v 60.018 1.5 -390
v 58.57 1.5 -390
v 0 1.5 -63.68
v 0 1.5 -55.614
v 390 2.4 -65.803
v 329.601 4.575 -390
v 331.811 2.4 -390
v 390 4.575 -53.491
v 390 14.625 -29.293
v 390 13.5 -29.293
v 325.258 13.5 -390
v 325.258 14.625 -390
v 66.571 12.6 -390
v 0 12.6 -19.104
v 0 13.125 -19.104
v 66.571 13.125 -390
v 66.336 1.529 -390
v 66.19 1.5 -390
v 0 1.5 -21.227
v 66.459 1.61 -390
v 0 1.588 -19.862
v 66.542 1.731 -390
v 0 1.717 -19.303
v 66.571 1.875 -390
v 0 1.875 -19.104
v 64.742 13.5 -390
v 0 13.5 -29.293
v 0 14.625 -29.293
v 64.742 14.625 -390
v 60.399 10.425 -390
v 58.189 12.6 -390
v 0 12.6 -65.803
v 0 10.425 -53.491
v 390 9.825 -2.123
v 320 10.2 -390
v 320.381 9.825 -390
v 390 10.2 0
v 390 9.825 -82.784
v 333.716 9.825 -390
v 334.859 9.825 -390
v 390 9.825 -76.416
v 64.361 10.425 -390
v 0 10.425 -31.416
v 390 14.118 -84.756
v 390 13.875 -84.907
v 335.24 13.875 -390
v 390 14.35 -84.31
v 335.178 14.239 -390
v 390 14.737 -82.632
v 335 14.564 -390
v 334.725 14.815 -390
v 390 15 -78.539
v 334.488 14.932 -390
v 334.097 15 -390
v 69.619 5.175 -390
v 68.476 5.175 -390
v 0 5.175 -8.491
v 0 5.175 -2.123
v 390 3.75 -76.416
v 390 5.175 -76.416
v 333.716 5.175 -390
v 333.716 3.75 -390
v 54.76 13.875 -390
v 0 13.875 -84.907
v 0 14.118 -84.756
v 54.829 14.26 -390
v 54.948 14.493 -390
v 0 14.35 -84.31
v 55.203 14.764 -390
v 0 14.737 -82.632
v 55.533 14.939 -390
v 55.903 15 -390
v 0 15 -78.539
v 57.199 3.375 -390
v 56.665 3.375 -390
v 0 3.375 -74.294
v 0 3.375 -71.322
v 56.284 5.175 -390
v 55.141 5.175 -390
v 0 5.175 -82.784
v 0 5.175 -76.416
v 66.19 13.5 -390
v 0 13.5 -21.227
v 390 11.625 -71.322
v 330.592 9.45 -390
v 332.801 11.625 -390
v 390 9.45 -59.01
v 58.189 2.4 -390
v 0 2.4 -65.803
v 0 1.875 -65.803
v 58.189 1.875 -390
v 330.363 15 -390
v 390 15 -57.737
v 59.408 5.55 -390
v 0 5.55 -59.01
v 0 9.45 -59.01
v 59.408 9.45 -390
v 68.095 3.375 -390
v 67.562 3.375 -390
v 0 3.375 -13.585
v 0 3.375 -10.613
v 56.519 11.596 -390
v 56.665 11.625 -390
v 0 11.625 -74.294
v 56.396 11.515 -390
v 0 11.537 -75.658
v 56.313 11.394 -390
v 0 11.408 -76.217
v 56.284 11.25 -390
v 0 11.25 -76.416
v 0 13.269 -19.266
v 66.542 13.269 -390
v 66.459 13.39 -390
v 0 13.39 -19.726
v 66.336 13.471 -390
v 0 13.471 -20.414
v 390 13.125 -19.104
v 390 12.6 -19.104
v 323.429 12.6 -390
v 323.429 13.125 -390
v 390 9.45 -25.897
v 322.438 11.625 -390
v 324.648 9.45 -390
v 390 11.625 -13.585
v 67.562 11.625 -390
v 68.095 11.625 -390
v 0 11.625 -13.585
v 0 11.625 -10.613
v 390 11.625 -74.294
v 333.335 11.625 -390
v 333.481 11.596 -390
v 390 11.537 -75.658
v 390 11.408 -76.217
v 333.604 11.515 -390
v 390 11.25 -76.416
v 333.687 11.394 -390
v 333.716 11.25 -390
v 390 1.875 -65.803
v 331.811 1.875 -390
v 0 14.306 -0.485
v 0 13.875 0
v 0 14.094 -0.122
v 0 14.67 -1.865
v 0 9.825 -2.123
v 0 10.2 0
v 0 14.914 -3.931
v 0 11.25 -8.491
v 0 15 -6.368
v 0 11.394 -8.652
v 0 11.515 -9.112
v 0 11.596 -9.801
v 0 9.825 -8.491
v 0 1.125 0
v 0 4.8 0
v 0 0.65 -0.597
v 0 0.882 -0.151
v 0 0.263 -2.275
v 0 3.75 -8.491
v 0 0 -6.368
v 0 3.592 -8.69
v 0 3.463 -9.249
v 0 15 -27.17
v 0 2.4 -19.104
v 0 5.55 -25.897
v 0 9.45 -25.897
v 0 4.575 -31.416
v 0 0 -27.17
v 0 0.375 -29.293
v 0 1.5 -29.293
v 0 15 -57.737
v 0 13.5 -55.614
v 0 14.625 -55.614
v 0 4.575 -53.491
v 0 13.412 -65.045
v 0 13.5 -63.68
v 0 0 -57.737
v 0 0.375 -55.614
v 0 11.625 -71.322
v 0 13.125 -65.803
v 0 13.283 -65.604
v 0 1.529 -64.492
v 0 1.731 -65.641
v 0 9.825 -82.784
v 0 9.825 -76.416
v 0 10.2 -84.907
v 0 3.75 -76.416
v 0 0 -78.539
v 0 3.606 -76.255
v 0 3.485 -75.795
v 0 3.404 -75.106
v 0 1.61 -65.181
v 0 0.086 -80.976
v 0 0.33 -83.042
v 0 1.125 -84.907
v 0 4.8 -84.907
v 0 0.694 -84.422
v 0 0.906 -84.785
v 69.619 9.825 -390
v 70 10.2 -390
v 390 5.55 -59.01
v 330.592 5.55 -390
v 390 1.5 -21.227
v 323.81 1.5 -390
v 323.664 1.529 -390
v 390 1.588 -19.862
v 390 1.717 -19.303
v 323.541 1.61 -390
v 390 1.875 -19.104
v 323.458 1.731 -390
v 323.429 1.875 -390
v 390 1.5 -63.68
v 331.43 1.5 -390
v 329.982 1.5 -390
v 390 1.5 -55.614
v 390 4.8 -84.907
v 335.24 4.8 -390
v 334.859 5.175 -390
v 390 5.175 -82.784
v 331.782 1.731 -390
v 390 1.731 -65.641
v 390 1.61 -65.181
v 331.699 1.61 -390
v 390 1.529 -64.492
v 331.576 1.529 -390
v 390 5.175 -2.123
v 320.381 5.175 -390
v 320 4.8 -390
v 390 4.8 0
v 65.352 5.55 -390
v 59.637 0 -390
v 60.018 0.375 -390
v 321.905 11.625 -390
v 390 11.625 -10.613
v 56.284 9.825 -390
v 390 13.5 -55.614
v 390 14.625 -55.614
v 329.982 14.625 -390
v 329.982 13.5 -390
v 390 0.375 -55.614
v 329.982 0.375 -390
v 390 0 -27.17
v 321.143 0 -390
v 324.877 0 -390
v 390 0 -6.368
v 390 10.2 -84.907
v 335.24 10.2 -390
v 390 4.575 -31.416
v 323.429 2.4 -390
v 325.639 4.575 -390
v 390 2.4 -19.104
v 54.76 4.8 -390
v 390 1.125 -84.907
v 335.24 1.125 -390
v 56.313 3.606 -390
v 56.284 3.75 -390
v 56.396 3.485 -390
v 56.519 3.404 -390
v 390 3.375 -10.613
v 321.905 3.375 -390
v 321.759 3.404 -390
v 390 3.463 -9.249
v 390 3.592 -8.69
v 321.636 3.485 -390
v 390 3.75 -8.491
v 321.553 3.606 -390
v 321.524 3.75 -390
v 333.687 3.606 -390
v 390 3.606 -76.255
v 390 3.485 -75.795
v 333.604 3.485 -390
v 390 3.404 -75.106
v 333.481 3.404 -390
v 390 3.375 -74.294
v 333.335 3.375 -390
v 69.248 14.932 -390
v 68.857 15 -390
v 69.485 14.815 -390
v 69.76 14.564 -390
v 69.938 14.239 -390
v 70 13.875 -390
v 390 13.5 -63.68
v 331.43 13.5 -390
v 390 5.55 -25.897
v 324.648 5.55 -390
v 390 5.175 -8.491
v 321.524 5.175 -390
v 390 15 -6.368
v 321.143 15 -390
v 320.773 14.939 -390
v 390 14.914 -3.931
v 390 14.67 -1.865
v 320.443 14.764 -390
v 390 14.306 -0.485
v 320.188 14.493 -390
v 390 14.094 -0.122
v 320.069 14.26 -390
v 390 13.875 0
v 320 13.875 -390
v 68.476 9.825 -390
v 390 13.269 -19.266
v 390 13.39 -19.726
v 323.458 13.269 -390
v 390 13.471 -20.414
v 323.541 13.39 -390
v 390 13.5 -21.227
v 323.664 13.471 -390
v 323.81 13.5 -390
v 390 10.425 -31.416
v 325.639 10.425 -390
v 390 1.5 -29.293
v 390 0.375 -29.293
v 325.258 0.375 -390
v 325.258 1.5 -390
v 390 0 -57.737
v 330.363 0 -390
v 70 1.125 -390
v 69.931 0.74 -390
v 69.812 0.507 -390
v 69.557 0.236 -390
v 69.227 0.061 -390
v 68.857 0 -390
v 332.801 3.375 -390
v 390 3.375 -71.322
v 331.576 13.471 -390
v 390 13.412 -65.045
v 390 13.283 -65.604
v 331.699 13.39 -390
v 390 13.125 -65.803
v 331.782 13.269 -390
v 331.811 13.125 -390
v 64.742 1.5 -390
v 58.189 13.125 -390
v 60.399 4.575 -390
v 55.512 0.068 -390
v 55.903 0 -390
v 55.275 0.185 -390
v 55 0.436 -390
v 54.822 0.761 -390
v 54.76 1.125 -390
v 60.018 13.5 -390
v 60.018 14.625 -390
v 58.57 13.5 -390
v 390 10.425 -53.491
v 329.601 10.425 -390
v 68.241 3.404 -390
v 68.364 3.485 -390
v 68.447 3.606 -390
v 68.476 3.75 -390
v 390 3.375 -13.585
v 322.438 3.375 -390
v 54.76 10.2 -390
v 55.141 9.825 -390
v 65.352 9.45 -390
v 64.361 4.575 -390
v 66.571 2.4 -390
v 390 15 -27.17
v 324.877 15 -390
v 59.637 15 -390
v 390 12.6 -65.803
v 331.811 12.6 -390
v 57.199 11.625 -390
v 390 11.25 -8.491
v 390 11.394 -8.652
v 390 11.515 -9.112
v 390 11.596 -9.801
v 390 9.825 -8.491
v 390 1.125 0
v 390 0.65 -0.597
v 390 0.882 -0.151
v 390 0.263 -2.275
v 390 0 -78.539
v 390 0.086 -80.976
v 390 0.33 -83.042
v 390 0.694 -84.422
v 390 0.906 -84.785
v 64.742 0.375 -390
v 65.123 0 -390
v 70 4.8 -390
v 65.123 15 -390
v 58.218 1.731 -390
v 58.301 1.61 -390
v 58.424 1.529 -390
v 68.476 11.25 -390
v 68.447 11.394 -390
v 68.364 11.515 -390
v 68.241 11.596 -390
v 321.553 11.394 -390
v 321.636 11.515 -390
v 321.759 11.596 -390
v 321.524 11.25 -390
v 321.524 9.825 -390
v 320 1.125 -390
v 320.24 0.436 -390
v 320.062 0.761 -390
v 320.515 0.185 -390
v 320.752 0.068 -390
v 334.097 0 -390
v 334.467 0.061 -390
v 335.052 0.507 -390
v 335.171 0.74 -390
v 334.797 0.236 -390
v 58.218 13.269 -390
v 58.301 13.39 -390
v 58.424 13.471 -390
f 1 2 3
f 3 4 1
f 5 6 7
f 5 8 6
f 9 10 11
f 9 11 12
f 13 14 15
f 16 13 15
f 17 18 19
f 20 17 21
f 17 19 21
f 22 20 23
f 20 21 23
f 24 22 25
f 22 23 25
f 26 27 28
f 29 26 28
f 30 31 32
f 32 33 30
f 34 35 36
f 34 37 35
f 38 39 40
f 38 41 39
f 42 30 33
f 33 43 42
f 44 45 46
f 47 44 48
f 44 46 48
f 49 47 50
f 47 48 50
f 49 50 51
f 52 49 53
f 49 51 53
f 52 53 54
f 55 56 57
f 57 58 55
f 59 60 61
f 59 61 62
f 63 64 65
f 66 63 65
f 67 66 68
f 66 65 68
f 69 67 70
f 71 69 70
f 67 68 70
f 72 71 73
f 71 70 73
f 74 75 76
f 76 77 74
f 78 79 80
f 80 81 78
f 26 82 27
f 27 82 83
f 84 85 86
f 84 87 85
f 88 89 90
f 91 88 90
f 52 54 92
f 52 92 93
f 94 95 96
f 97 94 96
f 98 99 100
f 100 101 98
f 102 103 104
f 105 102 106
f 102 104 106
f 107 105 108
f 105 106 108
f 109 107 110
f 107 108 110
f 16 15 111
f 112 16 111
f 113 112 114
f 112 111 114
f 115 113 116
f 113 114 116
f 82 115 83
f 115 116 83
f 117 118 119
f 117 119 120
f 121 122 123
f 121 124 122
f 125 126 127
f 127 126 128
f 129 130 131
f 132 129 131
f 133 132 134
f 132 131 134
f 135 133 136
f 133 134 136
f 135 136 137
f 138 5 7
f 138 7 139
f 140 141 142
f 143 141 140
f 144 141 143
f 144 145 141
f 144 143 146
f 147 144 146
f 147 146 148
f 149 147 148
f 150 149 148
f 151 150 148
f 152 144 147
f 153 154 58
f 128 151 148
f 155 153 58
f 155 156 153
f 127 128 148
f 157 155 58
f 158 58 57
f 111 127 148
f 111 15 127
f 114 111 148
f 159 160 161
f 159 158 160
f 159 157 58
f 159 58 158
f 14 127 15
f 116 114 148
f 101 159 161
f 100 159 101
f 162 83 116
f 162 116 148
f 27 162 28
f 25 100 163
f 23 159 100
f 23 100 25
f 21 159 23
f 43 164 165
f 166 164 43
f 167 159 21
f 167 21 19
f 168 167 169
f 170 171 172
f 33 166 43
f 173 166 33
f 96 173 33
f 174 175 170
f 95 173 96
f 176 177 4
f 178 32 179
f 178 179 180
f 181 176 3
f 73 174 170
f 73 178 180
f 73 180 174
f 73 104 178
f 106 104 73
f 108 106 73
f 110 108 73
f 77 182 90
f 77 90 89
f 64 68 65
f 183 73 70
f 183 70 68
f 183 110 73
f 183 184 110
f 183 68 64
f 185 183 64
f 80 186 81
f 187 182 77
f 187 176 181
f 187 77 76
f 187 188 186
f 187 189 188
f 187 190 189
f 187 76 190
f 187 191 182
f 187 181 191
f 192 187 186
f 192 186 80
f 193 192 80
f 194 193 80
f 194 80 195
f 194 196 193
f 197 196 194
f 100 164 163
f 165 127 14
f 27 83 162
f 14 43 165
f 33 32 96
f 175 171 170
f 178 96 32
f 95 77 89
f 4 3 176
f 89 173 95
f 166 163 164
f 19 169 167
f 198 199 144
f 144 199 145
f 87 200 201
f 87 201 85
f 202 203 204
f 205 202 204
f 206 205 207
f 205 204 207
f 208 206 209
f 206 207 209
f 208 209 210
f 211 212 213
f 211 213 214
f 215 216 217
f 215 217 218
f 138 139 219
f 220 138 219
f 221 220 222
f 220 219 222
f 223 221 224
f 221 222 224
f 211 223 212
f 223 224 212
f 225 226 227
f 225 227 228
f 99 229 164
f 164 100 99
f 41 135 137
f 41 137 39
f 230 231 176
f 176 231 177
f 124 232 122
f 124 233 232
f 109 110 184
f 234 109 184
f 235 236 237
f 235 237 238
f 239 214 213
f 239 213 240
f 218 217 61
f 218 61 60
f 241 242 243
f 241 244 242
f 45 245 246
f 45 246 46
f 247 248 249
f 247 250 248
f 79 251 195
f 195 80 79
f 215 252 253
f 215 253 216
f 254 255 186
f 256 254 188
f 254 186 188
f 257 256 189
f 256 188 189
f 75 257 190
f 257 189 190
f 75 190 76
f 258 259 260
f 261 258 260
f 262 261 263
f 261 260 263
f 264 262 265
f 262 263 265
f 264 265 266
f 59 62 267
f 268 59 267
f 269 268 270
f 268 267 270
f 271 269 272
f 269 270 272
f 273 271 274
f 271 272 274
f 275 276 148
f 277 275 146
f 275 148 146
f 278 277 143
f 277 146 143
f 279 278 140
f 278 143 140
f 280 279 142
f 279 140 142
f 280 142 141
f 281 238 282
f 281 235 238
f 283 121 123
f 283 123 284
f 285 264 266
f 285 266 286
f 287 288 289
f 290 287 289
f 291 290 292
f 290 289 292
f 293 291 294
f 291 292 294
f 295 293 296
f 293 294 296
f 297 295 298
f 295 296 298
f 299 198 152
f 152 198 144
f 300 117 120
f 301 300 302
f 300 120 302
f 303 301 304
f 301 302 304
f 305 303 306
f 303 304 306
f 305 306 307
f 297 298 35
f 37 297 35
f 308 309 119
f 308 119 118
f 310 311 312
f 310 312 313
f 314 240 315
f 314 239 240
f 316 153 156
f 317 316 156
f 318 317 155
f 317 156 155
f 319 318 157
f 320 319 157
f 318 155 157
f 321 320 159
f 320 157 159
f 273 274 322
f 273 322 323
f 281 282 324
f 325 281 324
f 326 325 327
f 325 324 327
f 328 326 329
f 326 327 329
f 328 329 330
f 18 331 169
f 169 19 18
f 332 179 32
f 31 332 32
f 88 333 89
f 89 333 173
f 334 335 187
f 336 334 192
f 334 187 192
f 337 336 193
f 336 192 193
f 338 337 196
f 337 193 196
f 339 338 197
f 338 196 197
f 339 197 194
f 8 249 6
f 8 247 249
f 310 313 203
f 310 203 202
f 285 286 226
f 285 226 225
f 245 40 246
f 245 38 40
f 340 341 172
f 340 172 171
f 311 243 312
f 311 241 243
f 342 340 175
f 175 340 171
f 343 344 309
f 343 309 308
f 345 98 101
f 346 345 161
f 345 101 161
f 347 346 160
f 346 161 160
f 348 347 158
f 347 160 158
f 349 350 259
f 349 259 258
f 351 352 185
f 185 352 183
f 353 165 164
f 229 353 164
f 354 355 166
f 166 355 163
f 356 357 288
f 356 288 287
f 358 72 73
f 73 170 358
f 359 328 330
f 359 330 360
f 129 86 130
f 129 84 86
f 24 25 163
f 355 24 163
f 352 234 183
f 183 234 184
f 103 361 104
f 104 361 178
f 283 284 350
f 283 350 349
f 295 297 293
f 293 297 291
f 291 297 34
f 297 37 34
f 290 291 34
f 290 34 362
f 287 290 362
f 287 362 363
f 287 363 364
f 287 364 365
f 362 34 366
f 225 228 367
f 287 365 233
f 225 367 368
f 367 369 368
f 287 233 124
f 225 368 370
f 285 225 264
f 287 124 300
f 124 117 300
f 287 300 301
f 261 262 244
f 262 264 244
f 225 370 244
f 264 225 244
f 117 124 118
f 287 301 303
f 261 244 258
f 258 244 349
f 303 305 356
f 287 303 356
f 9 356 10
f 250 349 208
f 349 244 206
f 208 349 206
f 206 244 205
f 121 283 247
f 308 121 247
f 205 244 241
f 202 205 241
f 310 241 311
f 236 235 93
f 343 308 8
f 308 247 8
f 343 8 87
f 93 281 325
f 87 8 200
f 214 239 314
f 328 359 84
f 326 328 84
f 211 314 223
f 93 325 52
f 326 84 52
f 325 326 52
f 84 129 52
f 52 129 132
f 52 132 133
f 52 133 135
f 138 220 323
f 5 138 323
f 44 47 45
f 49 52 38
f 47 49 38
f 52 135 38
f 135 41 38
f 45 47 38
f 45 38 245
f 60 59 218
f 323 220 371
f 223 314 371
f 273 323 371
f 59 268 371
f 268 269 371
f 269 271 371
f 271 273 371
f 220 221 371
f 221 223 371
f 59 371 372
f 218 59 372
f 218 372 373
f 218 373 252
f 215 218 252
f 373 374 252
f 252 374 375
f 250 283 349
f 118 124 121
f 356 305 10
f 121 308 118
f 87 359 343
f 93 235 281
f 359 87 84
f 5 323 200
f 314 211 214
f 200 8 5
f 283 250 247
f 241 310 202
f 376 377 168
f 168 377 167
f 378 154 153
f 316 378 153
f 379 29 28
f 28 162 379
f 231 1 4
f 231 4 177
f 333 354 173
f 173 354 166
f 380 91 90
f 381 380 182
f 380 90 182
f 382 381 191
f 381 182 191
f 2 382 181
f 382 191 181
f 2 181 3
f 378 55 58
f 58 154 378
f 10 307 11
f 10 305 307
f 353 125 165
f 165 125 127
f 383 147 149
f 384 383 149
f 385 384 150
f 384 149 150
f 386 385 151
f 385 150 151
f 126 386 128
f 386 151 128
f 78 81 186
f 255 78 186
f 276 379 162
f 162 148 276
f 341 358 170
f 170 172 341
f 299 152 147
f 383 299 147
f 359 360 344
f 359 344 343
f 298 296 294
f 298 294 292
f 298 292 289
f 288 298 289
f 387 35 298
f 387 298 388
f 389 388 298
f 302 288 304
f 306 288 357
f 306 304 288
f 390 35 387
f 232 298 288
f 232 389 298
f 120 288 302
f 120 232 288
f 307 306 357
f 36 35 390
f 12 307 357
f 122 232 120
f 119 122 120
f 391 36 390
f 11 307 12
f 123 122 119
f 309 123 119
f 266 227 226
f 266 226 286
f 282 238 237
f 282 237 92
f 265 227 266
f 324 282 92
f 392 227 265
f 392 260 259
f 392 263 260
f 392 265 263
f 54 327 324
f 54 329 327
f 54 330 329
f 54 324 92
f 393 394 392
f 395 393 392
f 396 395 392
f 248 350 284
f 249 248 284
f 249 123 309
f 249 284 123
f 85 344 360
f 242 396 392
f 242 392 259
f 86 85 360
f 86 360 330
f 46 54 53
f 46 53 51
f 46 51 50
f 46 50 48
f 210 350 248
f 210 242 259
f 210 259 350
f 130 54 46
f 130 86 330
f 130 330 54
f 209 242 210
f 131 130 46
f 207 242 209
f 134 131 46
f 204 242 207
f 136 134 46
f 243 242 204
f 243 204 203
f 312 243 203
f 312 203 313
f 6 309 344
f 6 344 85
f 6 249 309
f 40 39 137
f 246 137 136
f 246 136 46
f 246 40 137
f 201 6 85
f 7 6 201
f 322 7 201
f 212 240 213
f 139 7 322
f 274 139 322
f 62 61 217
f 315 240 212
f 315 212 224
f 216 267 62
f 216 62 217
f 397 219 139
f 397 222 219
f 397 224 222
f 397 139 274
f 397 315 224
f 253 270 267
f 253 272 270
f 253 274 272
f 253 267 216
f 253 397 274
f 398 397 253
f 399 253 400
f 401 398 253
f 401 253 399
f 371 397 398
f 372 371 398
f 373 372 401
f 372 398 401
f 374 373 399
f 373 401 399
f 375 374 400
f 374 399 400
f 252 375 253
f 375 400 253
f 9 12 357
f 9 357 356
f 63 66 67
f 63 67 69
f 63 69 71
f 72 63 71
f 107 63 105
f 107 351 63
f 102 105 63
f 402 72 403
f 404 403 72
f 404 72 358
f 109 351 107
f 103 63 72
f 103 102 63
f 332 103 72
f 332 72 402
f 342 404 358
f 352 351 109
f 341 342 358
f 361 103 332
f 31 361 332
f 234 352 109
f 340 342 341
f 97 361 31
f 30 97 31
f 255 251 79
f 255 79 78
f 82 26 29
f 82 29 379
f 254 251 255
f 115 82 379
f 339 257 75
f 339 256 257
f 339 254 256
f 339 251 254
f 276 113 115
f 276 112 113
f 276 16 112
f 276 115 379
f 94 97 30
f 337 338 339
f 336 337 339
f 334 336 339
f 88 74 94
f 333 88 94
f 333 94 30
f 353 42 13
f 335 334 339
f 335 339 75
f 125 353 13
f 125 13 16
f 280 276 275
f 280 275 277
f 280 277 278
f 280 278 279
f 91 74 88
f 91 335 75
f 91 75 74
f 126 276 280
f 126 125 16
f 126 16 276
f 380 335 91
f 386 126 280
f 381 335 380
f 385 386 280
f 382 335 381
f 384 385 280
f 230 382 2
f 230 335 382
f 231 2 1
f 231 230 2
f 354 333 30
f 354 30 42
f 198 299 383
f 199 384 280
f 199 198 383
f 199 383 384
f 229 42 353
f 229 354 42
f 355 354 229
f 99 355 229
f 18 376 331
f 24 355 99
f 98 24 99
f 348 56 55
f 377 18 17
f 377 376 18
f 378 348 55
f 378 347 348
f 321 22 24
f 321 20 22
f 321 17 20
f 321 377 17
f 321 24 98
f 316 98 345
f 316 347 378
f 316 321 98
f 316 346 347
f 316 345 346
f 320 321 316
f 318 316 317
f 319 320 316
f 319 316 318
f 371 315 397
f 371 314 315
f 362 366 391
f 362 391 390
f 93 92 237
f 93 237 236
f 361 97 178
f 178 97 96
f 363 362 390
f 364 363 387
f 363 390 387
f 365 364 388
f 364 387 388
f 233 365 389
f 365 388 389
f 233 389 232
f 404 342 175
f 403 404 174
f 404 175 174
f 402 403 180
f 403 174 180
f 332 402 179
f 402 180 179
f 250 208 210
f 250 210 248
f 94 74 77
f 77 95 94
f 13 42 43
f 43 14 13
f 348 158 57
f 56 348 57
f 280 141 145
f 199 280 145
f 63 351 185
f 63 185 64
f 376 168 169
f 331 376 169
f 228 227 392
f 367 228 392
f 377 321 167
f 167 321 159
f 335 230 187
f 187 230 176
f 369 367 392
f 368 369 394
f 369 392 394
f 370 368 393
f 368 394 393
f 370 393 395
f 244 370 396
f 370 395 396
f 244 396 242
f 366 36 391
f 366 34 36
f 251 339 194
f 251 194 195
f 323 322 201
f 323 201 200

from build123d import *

# Parameters (mm, degrees)
ALUMINUM_START                        = -327.333270634
ALUMINUM_PROFILES_VRC_15X15_2_DEPTH   = 396.232255124
ALUMINUM_PROFILES_VRC_15X15_2_2_DEPTH = 396.232255123
CUT_EXTRUDE2_DEPTH                    = 565.121390002
CUT_EXTRUDE2_DEPTH_BACK               = 565.121390002
SKETCH5_W                             = 23.238168361
SKETCH5_H                             = 113.39268938
SKETCH5_W_2                           = 161.911998808
SKETCH5_H_2                           = 133.487324877
SKETCH5_W_3                           = 195.704106921
SKETCH5_H_3                           = 154.963599137
SKETCH5_W_4                           = 70


# Read off the part's stored shape, not the designer's step: Aluminum profiles VRC_15X15(2)
with BuildPart() as part:
    # Aluminum profiles VRC_15X15(2) outline → Aluminum profiles VRC_15X15(2) (new body)
    with BuildSketch(Plane(origin=(0, 0, 0), x_dir=(0.984271206993884, 0, -0.17666406279377403), z_dir=(0.17666406279377403, 0, 0.9842712069938842)).offset(ALUMINUM_START)):
        with BuildLine():
            Line((389.415770728, 4.575), (393.315770728, 4.575))
            Line((393.315770728, 4.575), (395.490770728, 2.4))
            Line((395.490770728, 2.4), (395.490770728, 1.875))
            ThreePointArc((395.490770728, 1.875), (395.380935771, 1.609834957), (395.115770728, 1.5))
            Line((395.115770728, 1.5), (393.690770728, 1.5))
            Line((393.690770728, 1.5), (393.690770728, 0.375))
            Line((393.690770728, 0.375), (394.065770728, 0))
            Line((394.065770728, 0), (397.740770728, 0))
            ThreePointArc((397.740770728, 0), (398.536265856, 0.329504871), (398.865770728, 1.125))
            Line((398.865770728, 1.125), (398.865770728, 4.8))
            Line((398.865770728, 4.8), (398.490770728, 5.175))
            Line((398.490770728, 5.175), (397.365770728, 5.175))
            Line((397.365770728, 5.175), (397.365770728, 3.75))
            ThreePointArc((397.365770728, 3.75), (397.255935771, 3.484834957), (396.990770728, 3.375))
            Line((396.990770728, 3.375), (396.465770728, 3.375))
            Line((396.465770728, 3.375), (394.290770728, 5.55))
            Line((394.290770728, 5.55), (394.290770728, 9.45))
            Line((394.290770728, 9.45), (396.465770728, 11.625))
            Line((396.465770728, 11.625), (396.990770728, 11.625))
            ThreePointArc((396.990770728, 11.625), (397.255935771, 11.515165043), (397.365770728, 11.25))
            Line((397.365770728, 11.25), (397.365770728, 9.825))
            Line((397.365770728, 9.825), (398.490770728, 9.825))
            Line((398.490770728, 9.825), (398.865770728, 10.2))
            Line((398.865770728, 10.2), (398.865770728, 13.875))
            ThreePointArc((398.865770728, 13.875), (398.536265856, 14.670495129), (397.740770728, 15))
            Line((397.740770728, 15), (394.065770728, 15))
            Line((394.065770728, 15), (393.690770728, 14.625))
            Line((393.690770728, 14.625), (393.690770728, 13.5))
            Line((393.690770728, 13.5), (395.115770728, 13.5))
            ThreePointArc((395.115770728, 13.5), (395.380935771, 13.390165043), (395.490770728, 13.125))
            Line((395.490770728, 13.125), (395.490770728, 12.6))
            Line((395.490770728, 12.6), (393.315770728, 10.425))
            Line((393.315770728, 10.425), (389.415770728, 10.425))
            Line((389.415770728, 10.425), (387.240770728, 12.6))
            Line((387.240770728, 12.6), (387.240770728, 13.125))
            ThreePointArc((387.240770728, 13.125), (387.350605685, 13.390165043), (387.615770728, 13.5))
            Line((387.615770728, 13.5), (389.040770728, 13.5))
            Line((389.040770728, 13.5), (389.040770728, 14.625))
            Line((389.040770728, 14.625), (388.665770728, 15))
            Line((388.665770728, 15), (384.990770728, 15))
            ThreePointArc((384.990770728, 15), (384.195275599, 14.670495129), (383.865770728, 13.875))
            Line((383.865770728, 13.875), (383.865770728, 10.2))
            Line((383.865770728, 10.2), (384.240770728, 9.825))
            Line((384.240770728, 9.825), (385.365770728, 9.825))
            Line((385.365770728, 9.825), (385.365770728, 11.25))
            ThreePointArc((385.365770728, 11.25), (385.475605685, 11.515165043), (385.740770728, 11.625))
            Line((385.740770728, 11.625), (386.265770728, 11.625))
            Line((386.265770728, 11.625), (388.440770728, 9.45))
            Line((388.440770728, 9.45), (388.440770728, 5.55))
            Line((388.440770728, 5.55), (386.265770728, 3.375))
            Line((386.265770728, 3.375), (385.740770728, 3.375))
            ThreePointArc((385.740770728, 3.375), (385.475605685, 3.484834957), (385.365770728, 3.75))
            Line((385.365770728, 3.75), (385.365770728, 5.175))
            Line((385.365770728, 5.175), (384.240770728, 5.175))
            Line((384.240770728, 5.175), (383.865770728, 4.8))
            Line((383.865770728, 4.8), (383.865770728, 1.125))
            ThreePointArc((383.865770728, 1.125), (384.195275599, 0.329504871), (384.990770728, 0))
            Line((384.990770728, 0), (388.665770728, 0))
            Line((388.665770728, 0), (389.040770728, 0.375))
            Line((389.040770728, 0.375), (389.040770728, 1.5))
            Line((389.040770728, 1.5), (387.615770728, 1.5))
            ThreePointArc((387.615770728, 1.5), (387.350605685, 1.609834957), (387.240770728, 1.875))
            Line((387.240770728, 1.875), (387.240770728, 2.4))
            Line((387.240770728, 2.4), (389.415770728, 4.575))
        make_face()
    extrude(amount=ALUMINUM_PROFILES_VRC_15X15_2_DEPTH)


with BuildPart() as body_2:
    # Aluminum profiles VRC_15X15_2 2 outline → Aluminum profiles VRC_15X15_2 2 (new body)
    with BuildSketch(Plane(origin=(0, 0, 0), x_dir=(0.984271206993884, 0, 0.17666406279377403), z_dir=(0.17666406279377403, 0, -0.9842712069938842))):
        with BuildLine():
            Line((-5.55, -4.575), (-9.45, -4.575))
            Line((-9.45, -4.575), (-11.625, -2.4))
            Line((-11.625, -2.4), (-11.625, -1.875))
            ThreePointArc((-11.625, -1.875), (-11.515165043, -1.609834957), (-11.25, -1.5))
            Line((-11.25, -1.5), (-9.825, -1.5))
            Line((-9.825, -1.5), (-9.825, -0.375))
            Line((-9.825, -0.375), (-10.2, 0))
            Line((-10.2, 0), (-13.875, 0))
            ThreePointArc((-13.875, 0), (-14.670495129, -0.329504871), (-15, -1.125))
            Line((-15, -1.125), (-15, -4.8))
            Line((-15, -4.8), (-14.625, -5.175))
            Line((-14.625, -5.175), (-13.5, -5.175))
            Line((-13.5, -5.175), (-13.5, -3.75))
            ThreePointArc((-13.5, -3.75), (-13.390165043, -3.484834957), (-13.125, -3.375))
            Line((-13.125, -3.375), (-12.6, -3.375))
            Line((-12.6, -3.375), (-10.425, -5.55))
            Line((-10.425, -5.55), (-10.425, -9.45))
            Line((-10.425, -9.45), (-12.6, -11.625))
            Line((-12.6, -11.625), (-13.125, -11.625))
            ThreePointArc((-13.125, -11.625), (-13.390165043, -11.515165043), (-13.5, -11.25))
            Line((-13.5, -11.25), (-13.5, -9.825))
            Line((-13.5, -9.825), (-14.625, -9.825))
            Line((-14.625, -9.825), (-15, -10.2))
            Line((-15, -10.2), (-15, -13.875))
            ThreePointArc((-15, -13.875), (-14.670495129, -14.670495129), (-13.875, -15))
            Line((-13.875, -15), (-10.2, -15))
            Line((-10.2, -15), (-9.825, -14.625))
            Line((-9.825, -14.625), (-9.825, -13.5))
            Line((-9.825, -13.5), (-11.25, -13.5))
            ThreePointArc((-11.25, -13.5), (-11.515165043, -13.390165043), (-11.625, -13.125))
            Line((-11.625, -13.125), (-11.625, -12.6))
            Line((-11.625, -12.6), (-9.45, -10.425))
            Line((-9.45, -10.425), (-5.55, -10.425))
            Line((-5.55, -10.425), (-3.375, -12.6))
            Line((-3.375, -12.6), (-3.375, -13.125))
            ThreePointArc((-3.375, -13.125), (-3.484834957, -13.390165043), (-3.75, -13.5))
            Line((-3.75, -13.5), (-5.175, -13.5))
            Line((-5.175, -13.5), (-5.175, -14.625))
            Line((-5.175, -14.625), (-4.8, -15))
            Line((-4.8, -15), (-1.125, -15))
            ThreePointArc((-1.125, -15), (-0.329504871, -14.670495129), (0, -13.875))
            Line((0, -13.875), (0, -10.2))
            Line((0, -10.2), (-0.375, -9.825))
            Line((-0.375, -9.825), (-1.5, -9.825))
            Line((-1.5, -9.825), (-1.5, -11.25))
            ThreePointArc((-1.5, -11.25), (-1.609834957, -11.515165043), (-1.875, -11.625))
            Line((-1.875, -11.625), (-2.4, -11.625))
            Line((-2.4, -11.625), (-4.575, -9.45))
            Line((-4.575, -9.45), (-4.575, -5.55))
            Line((-4.575, -5.55), (-2.4, -3.375))
            Line((-2.4, -3.375), (-1.875, -3.375))
            ThreePointArc((-1.875, -3.375), (-1.609834957, -3.484834957), (-1.5, -3.75))
            Line((-1.5, -3.75), (-1.5, -5.175))
            Line((-1.5, -5.175), (-0.375, -5.175))
            Line((-0.375, -5.175), (0, -4.8))
            Line((0, -4.8), (0, -1.125))
            ThreePointArc((0, -1.125), (-0.329504871, -0.329504871), (-1.125, 0))
            Line((-1.125, 0), (-4.8, 0))
            Line((-4.8, 0), (-5.175, -0.375))
            Line((-5.175, -0.375), (-5.175, -1.5))
            Line((-5.175, -1.5), (-3.75, -1.5))
            ThreePointArc((-3.75, -1.5), (-3.484834957, -1.609834957), (-3.375, -1.875))
            Line((-3.375, -1.875), (-3.375, -2.4))
            Line((-3.375, -2.4), (-5.55, -4.575))
        make_face()
    extrude(amount=ALUMINUM_PROFILES_VRC_15X15_2_2_DEPTH)


with BuildPart() as cut_extrude2_tool:
    # Sketch5 → Cut-Extrude2 (new, two sides: drawn at the far end of the back side and taken through both)
    with BuildSketch(Plane(origin=(0, 15, 0), x_dir=(1, 0, 0), z_dir=(0, 1, 0)).offset(-CUT_EXTRUDE2_DEPTH_BACK)):
        with Locations((-11.619084181, 56.69634469)):
            Rectangle(SKETCH5_W, SKETCH5_H)
        with Locations((470.955999404, 66.743662439)):
            Rectangle(SKETCH5_W_2, SKETCH5_H_2)
        with Locations((373.793651941, 467.481799569)):
            Rectangle(SKETCH5_W_3, SKETCH5_H_3)
        with Locations((35, 467.481799569)):
            Rectangle(SKETCH5_W_4, SKETCH5_H_3)
    extrude(amount=CUT_EXTRUDE2_DEPTH + CUT_EXTRUDE2_DEPTH_BACK)


with BuildPart() as part_1:
    add(part.part)

    # Cut-Extrude2: cut by cut_extrude2_tool
    add(cut_extrude2_tool.part, mode=Mode.SUBTRACT)


with BuildPart() as body_2_1:
    add(body_2.part)

    # Cut-Extrude2: cut by cut_extrude2_tool
    add(cut_extrude2_tool.part, mode=Mode.SUBTRACT)


solid = Compound([part_1.part, body_2_1.part])
